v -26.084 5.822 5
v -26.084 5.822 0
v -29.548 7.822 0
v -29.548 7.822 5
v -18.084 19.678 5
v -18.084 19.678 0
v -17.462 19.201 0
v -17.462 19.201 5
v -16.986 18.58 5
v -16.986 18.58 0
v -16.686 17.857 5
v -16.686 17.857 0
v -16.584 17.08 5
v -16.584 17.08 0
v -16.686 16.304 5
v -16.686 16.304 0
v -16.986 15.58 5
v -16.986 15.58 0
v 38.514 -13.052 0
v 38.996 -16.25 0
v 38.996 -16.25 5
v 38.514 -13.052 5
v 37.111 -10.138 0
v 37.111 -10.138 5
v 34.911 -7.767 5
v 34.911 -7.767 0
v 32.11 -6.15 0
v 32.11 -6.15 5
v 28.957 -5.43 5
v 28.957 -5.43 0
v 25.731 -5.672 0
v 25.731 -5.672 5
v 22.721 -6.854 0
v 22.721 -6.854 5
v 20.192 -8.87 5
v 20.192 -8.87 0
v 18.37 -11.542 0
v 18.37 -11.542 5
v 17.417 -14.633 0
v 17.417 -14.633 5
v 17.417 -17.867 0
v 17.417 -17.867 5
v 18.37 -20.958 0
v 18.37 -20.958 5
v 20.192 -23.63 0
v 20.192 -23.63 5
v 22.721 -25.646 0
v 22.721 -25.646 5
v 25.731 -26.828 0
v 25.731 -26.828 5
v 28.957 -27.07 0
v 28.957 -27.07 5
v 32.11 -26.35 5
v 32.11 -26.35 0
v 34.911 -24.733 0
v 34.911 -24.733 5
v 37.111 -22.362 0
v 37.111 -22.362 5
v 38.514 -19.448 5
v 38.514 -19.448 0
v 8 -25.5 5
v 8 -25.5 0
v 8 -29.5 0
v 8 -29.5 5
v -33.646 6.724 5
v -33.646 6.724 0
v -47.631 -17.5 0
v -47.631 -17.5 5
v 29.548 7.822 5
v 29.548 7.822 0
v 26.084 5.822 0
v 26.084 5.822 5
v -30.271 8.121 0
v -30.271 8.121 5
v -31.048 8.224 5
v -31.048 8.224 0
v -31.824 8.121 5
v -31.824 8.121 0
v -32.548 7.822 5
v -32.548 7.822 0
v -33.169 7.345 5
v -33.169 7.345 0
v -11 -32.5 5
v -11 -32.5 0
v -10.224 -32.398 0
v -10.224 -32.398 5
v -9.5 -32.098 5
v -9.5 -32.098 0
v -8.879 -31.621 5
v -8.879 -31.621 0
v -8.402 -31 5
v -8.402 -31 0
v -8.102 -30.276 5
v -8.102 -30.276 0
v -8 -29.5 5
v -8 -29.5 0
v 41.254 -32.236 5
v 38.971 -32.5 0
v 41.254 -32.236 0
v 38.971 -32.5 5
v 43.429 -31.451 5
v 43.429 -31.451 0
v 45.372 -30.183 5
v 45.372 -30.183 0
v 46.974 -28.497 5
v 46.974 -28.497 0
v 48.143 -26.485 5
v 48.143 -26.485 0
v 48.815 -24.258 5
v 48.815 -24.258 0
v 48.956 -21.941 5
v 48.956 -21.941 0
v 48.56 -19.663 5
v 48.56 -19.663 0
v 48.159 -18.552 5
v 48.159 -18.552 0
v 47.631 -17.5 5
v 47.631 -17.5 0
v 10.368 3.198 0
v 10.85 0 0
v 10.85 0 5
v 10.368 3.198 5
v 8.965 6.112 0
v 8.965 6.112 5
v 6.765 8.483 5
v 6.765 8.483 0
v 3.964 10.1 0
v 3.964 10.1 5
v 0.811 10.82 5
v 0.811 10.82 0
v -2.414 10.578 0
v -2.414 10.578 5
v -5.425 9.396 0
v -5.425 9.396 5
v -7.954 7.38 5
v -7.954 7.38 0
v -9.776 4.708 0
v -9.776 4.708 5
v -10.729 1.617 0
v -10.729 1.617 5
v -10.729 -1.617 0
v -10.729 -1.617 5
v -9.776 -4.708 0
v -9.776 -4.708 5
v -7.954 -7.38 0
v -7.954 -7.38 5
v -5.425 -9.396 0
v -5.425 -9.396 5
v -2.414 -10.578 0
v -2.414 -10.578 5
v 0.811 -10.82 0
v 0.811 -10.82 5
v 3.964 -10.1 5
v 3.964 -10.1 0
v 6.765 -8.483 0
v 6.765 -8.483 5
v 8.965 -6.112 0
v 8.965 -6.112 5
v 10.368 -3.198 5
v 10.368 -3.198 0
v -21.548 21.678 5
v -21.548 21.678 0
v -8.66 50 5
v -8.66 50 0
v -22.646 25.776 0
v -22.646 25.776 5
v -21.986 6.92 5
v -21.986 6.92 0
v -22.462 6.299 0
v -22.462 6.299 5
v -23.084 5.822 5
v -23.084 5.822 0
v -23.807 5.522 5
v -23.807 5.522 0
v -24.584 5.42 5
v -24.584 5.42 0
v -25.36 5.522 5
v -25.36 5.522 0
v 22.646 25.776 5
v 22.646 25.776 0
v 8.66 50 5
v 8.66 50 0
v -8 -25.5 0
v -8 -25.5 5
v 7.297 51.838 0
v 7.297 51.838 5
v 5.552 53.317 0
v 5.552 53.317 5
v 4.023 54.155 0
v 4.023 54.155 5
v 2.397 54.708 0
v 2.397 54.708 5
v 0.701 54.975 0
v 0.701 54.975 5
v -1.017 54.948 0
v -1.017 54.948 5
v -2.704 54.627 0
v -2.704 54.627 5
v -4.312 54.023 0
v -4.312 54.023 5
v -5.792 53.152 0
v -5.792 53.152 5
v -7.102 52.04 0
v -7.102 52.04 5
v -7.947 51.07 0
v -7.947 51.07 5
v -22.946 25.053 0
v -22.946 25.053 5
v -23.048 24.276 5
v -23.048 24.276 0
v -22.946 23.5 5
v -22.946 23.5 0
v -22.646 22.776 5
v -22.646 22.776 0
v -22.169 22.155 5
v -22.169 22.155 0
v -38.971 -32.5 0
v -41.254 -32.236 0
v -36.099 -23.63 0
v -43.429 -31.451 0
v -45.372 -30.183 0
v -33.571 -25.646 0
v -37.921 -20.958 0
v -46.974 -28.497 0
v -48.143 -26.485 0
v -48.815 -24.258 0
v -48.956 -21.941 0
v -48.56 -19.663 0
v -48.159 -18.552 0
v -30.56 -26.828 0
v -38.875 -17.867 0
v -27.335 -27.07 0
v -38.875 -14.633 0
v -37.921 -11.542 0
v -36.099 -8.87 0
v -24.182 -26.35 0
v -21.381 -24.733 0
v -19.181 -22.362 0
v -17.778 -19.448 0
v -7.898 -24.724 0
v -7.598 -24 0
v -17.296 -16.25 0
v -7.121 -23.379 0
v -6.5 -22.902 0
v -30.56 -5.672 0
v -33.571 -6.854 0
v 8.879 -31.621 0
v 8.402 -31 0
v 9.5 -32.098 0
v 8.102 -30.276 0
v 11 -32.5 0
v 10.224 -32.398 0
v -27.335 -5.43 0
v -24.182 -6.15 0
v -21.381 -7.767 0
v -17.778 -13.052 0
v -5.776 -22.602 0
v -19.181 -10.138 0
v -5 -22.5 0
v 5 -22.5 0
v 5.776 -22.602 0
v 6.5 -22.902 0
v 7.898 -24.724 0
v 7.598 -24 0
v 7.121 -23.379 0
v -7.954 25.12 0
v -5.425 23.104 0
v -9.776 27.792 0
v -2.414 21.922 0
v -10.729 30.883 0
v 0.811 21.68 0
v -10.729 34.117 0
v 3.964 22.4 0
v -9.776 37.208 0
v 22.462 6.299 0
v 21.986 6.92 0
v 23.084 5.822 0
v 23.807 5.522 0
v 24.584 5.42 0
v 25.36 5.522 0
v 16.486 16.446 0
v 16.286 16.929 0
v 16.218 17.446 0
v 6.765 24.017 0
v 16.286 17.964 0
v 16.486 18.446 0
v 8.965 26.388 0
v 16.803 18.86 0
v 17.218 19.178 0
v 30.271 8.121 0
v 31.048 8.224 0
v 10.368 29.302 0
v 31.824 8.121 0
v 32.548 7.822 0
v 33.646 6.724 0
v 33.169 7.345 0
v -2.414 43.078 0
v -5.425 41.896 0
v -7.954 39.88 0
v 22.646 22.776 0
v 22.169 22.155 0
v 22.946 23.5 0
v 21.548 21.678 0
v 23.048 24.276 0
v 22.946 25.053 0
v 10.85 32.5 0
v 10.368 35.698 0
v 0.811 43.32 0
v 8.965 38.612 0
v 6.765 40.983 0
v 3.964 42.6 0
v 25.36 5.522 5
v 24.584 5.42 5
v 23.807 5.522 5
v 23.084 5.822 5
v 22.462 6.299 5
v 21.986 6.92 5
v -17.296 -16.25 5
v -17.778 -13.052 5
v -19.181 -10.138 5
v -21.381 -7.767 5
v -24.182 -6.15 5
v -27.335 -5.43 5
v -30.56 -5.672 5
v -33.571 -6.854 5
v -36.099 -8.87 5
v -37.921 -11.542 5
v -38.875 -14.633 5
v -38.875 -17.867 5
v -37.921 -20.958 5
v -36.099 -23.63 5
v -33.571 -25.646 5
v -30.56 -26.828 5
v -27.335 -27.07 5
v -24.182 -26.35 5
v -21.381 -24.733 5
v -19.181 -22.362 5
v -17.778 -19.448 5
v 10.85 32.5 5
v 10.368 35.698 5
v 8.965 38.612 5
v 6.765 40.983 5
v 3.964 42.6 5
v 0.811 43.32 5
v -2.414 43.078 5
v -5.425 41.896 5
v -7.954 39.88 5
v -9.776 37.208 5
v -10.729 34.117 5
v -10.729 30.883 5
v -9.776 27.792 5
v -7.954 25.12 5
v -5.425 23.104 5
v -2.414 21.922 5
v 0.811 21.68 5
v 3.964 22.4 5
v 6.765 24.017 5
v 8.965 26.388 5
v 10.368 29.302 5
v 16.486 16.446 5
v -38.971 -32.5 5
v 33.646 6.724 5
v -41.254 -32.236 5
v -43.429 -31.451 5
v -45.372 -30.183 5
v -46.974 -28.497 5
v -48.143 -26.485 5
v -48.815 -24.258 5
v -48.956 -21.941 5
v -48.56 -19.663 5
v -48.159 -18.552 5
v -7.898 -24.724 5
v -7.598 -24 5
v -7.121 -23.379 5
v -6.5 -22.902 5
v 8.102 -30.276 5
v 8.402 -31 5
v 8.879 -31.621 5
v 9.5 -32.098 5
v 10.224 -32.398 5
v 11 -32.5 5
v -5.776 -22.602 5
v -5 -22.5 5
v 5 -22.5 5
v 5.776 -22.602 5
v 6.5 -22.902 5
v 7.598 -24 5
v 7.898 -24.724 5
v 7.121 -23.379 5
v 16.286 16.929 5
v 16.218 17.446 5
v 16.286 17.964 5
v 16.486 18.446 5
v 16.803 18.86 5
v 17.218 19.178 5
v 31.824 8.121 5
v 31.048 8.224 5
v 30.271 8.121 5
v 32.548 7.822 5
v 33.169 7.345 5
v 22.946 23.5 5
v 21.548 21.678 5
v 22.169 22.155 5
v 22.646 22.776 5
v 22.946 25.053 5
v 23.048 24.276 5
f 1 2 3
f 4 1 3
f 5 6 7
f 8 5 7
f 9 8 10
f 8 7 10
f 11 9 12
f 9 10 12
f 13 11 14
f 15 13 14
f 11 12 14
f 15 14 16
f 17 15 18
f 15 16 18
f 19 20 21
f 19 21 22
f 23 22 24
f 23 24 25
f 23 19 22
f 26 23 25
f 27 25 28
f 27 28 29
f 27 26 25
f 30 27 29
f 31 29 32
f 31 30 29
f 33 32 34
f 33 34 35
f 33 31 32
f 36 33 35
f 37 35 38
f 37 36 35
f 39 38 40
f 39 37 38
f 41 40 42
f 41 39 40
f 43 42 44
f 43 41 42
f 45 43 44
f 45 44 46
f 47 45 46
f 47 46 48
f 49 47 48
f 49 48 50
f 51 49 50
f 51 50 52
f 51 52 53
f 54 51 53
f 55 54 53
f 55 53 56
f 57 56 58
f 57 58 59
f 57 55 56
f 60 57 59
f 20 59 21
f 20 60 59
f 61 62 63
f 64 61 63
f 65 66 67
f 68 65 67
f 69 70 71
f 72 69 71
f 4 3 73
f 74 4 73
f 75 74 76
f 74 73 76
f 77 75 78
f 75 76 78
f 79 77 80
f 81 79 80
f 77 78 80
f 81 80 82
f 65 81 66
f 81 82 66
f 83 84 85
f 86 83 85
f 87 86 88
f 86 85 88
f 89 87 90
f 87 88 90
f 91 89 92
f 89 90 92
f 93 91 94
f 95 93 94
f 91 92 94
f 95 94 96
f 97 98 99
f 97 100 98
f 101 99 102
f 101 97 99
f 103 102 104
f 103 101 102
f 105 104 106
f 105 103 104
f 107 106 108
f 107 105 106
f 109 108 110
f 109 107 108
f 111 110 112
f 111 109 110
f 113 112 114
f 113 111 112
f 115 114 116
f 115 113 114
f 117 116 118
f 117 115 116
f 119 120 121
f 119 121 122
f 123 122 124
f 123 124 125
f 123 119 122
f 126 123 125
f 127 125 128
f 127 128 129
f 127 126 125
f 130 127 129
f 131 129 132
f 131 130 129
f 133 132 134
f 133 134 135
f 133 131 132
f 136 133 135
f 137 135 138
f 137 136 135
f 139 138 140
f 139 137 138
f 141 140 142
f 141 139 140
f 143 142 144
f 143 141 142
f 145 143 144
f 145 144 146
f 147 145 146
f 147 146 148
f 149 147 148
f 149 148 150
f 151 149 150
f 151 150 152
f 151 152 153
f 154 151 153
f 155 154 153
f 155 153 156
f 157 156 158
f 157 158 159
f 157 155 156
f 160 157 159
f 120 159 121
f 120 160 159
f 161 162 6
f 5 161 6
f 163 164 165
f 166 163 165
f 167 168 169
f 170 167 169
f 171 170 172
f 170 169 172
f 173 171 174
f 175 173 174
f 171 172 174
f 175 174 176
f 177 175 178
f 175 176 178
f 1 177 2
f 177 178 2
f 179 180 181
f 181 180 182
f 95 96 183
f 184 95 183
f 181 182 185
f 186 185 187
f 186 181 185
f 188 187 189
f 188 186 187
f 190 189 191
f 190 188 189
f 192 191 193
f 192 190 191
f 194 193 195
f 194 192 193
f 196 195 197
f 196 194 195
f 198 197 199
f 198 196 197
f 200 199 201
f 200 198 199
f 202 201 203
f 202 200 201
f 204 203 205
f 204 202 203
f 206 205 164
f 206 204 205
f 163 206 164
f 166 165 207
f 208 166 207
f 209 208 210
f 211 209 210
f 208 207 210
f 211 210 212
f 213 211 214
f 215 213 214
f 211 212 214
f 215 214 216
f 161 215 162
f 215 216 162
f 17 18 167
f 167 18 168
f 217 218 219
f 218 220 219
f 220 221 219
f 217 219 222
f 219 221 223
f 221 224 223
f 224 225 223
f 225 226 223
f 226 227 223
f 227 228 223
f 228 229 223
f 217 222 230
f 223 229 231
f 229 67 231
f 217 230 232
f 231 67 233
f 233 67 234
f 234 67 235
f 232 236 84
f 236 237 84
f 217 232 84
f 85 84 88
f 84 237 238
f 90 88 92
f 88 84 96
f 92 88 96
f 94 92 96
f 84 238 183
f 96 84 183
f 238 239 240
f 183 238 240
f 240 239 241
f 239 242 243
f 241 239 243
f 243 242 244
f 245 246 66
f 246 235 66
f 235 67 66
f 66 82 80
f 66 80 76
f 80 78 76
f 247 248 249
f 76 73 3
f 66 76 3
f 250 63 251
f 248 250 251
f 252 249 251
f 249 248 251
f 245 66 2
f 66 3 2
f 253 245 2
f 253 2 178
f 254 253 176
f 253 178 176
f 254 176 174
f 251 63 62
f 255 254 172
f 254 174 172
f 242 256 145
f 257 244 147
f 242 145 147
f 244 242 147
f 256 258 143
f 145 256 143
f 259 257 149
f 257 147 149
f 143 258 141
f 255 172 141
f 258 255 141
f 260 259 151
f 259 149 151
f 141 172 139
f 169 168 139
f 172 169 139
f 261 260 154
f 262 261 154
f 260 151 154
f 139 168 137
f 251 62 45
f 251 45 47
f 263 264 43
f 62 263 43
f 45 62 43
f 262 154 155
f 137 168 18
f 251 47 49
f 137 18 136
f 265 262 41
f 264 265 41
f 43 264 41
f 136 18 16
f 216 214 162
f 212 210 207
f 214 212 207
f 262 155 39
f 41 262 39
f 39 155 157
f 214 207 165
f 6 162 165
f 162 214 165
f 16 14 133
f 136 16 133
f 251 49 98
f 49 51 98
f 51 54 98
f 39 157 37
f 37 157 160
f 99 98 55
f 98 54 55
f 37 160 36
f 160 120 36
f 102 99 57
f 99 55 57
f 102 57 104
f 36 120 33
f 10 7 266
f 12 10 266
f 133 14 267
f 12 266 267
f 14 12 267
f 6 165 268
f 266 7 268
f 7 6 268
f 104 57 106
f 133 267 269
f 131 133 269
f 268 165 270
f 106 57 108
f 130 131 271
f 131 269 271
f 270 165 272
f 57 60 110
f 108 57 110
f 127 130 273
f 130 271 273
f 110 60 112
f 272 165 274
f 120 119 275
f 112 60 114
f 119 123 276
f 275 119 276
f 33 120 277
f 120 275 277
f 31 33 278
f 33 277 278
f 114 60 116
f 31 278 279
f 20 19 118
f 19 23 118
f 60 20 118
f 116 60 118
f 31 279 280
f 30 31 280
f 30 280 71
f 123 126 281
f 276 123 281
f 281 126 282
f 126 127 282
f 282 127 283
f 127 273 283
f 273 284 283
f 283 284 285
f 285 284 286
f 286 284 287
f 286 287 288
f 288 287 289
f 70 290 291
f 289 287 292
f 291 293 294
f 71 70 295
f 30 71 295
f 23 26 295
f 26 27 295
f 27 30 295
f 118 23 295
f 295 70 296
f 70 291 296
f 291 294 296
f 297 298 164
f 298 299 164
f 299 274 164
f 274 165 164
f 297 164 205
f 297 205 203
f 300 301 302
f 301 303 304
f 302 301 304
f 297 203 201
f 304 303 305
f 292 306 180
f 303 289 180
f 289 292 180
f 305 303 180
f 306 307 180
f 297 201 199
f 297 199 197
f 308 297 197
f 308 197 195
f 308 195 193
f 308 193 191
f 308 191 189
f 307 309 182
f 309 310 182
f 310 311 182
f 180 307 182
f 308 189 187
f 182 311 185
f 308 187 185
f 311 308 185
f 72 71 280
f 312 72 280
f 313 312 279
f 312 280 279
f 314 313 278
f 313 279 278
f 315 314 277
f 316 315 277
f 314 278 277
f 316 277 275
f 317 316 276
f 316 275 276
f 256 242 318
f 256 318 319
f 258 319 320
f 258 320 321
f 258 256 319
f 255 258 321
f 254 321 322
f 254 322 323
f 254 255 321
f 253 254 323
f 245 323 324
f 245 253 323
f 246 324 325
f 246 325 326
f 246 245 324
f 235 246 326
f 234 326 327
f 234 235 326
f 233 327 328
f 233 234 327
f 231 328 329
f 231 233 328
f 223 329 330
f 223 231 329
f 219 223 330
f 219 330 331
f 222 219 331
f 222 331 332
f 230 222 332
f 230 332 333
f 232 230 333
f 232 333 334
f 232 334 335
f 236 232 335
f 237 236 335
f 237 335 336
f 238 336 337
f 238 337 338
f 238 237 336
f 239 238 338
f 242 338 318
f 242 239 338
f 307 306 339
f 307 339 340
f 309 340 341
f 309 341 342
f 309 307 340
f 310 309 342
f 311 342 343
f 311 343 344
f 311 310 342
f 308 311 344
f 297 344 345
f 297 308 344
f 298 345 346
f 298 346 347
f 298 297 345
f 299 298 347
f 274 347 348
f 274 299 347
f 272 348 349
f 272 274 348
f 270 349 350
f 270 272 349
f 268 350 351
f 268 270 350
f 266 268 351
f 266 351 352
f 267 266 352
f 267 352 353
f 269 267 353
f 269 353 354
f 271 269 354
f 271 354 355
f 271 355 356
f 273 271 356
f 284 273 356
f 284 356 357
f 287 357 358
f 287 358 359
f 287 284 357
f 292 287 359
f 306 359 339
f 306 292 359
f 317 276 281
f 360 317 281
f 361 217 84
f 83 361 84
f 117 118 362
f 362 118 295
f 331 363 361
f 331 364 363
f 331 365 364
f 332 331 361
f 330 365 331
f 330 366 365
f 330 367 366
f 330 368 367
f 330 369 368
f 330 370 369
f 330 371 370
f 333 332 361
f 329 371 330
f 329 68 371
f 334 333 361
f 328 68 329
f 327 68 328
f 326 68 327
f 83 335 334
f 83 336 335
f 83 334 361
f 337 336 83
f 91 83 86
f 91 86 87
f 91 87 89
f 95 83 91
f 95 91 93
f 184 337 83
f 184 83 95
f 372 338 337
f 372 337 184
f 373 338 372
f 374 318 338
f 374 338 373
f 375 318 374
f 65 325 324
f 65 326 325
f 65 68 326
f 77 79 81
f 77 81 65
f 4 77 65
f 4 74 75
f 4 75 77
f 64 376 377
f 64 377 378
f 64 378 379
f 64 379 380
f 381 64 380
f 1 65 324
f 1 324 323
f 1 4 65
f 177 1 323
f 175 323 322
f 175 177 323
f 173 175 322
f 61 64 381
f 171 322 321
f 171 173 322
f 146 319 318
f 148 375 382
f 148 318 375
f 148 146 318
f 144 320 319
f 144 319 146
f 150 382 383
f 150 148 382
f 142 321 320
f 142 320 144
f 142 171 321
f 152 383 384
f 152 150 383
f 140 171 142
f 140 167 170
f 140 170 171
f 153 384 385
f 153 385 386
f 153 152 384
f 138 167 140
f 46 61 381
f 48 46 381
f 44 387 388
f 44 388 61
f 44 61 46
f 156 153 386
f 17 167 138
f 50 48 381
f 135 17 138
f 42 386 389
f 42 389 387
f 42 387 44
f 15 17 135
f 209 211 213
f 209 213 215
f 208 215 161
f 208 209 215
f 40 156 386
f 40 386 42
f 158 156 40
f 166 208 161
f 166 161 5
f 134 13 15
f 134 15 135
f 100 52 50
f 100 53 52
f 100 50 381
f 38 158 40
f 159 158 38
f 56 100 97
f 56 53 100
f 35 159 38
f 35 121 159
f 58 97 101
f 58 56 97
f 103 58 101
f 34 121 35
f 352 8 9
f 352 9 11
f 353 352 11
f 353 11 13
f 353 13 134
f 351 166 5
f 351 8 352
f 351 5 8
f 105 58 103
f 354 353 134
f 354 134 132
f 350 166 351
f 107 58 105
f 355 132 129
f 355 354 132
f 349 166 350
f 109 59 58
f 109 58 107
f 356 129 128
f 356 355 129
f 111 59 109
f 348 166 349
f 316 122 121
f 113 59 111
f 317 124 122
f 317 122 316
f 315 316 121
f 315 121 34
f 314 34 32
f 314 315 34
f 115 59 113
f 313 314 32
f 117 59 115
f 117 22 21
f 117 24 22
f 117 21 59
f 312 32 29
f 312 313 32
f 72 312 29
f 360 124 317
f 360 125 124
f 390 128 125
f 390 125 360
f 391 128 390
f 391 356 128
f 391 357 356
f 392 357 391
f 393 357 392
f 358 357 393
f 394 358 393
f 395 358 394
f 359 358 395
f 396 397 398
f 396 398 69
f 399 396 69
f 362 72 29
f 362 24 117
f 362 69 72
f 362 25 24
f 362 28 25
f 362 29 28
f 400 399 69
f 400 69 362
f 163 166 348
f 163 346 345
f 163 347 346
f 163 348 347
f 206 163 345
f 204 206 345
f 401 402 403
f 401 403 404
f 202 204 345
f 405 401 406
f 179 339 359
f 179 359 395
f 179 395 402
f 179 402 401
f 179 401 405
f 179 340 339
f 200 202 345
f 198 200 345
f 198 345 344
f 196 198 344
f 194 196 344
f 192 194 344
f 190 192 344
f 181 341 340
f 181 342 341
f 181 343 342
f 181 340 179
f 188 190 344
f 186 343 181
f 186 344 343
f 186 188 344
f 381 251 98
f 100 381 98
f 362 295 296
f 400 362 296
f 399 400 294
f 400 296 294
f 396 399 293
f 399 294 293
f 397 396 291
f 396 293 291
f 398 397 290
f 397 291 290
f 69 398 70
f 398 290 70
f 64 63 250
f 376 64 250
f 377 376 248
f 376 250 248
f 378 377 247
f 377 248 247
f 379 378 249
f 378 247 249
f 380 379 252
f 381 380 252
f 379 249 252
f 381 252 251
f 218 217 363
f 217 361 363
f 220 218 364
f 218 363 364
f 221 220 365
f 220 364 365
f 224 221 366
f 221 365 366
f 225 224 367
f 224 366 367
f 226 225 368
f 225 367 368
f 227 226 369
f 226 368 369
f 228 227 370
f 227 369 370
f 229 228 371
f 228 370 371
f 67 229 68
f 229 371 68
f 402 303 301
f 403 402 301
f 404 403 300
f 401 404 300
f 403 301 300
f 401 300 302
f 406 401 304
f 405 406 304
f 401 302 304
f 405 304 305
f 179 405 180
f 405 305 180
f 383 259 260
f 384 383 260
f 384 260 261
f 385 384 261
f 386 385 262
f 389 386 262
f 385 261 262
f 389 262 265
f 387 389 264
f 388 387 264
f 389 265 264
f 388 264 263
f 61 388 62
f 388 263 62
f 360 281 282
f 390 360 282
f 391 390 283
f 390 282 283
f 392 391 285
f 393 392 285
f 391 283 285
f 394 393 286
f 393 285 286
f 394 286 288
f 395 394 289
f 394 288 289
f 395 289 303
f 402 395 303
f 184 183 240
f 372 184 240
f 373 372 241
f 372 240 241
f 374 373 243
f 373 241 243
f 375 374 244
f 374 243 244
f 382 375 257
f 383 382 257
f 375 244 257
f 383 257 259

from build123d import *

# Parameters (mm, degrees)
F0_R     = 10.85
F1_DEPTH = 5
F2_R     = 10


with BuildPart() as f1:
    # F0 (on Top) → F1 (new body)
    with BuildSketch(Plane.XY):
        with BuildLine():
            Line((11, -32.5), (42.435245, -32.5))
            Line((42.435245, -32.5), (56.291651, -32.5))
            Line((56.291651, -32.5), (51.528512, -24.25))
            Line((51.528512, -24.25), (33.645826, 6.723721))
            ThreePointArc((33.645826, 6.723721), (31.824207, 8.121498), (29.547749, 7.821797))
            Line((29.547749, 7.821797), (26.083648, 5.821797))
            ThreePointArc((26.083648, 5.821797), (23.807191, 5.522096), (21.985572, 6.919873))
            Line((21.985572, 6.919873), (16.485572, 16.446152))
            ThreePointArc((16.485572, 16.446152), (16.285771, 17.963791), (17.217622, 19.178203))
            Line((17.217622, 19.178203), (21.547749, 21.678203))
            ThreePointArc((21.547749, 21.678203), (22.945527, 23.499822), (22.645826, 25.776279))
            Line((22.645826, 25.776279), (4.76314, 56.75))
            Line((4.76314, 56.75), (0, 65))
            Line((0, 65), (-4.76314, 56.75))
            Line((-4.76314, 56.75), (-22.645826, 25.776279))
            ThreePointArc((-22.645826, 25.776279), (-22.945527, 23.499822), (-21.547749, 21.678203))
            Line((-21.547749, 21.678203), (-18.083648, 19.678203))
            ThreePointArc((-18.083648, 19.678203), (-16.68587, 17.856584), (-16.985572, 15.580127))
            Line((-16.985572, 15.580127), (-21.985572, 6.919873))
            ThreePointArc((-21.985572, 6.919873), (-23.807191, 5.522096), (-26.083648, 5.821797))
            Line((-26.083648, 5.821797), (-29.547749, 7.821797))
            ThreePointArc((-29.547749, 7.821797), (-31.824207, 8.121498), (-33.645826, 6.723721))
            Line((-33.645826, 6.723721), (-51.528512, -24.25))
            Line((-51.528512, -24.25), (-56.291651, -32.5))
            Line((-56.291651, -32.5), (-21.644953, -32.5))
            Line((-21.644953, -32.5), (-11, -32.5))
            ThreePointArc((-11, -32.5), (-8.87868, -31.62132), (-8, -29.5))
            Line((-8, -29.5), (-8, -25.5))
            ThreePointArc((-8, -25.5), (-7.12132, -23.37868), (-5, -22.5))
            Line((-5, -22.5), (5, -22.5))
            ThreePointArc((5, -22.5), (7.12132, -23.37868), (8, -25.5))
            Line((8, -25.5), (8, -29.5))
            ThreePointArc((8, -29.5), (8.87868, -31.62132), (11, -32.5))
        make_face()
        with Locations((-28.145826, -16.25)):
            Circle(F0_R, mode=Mode.SUBTRACT)
        with Locations((28.145826, -16.25)):
            Circle(F0_R, mode=Mode.SUBTRACT)
        Circle(F0_R, mode=Mode.SUBTRACT)
        with Locations((0, 32.5)):
            Circle(F0_R, mode=Mode.SUBTRACT)
    extrude(amount=F1_DEPTH)

    # F2
    f2_edges = [f1.edges().sort_by_distance(p)[0] for p in [
        (56.291651, -32.5, 2.5),
        (0, 65, 2.5),
        (-56.291651, -32.5, 2.5),
    ]]
    fillet(f2_edges, radius=F2_R)


solid = f1.part
